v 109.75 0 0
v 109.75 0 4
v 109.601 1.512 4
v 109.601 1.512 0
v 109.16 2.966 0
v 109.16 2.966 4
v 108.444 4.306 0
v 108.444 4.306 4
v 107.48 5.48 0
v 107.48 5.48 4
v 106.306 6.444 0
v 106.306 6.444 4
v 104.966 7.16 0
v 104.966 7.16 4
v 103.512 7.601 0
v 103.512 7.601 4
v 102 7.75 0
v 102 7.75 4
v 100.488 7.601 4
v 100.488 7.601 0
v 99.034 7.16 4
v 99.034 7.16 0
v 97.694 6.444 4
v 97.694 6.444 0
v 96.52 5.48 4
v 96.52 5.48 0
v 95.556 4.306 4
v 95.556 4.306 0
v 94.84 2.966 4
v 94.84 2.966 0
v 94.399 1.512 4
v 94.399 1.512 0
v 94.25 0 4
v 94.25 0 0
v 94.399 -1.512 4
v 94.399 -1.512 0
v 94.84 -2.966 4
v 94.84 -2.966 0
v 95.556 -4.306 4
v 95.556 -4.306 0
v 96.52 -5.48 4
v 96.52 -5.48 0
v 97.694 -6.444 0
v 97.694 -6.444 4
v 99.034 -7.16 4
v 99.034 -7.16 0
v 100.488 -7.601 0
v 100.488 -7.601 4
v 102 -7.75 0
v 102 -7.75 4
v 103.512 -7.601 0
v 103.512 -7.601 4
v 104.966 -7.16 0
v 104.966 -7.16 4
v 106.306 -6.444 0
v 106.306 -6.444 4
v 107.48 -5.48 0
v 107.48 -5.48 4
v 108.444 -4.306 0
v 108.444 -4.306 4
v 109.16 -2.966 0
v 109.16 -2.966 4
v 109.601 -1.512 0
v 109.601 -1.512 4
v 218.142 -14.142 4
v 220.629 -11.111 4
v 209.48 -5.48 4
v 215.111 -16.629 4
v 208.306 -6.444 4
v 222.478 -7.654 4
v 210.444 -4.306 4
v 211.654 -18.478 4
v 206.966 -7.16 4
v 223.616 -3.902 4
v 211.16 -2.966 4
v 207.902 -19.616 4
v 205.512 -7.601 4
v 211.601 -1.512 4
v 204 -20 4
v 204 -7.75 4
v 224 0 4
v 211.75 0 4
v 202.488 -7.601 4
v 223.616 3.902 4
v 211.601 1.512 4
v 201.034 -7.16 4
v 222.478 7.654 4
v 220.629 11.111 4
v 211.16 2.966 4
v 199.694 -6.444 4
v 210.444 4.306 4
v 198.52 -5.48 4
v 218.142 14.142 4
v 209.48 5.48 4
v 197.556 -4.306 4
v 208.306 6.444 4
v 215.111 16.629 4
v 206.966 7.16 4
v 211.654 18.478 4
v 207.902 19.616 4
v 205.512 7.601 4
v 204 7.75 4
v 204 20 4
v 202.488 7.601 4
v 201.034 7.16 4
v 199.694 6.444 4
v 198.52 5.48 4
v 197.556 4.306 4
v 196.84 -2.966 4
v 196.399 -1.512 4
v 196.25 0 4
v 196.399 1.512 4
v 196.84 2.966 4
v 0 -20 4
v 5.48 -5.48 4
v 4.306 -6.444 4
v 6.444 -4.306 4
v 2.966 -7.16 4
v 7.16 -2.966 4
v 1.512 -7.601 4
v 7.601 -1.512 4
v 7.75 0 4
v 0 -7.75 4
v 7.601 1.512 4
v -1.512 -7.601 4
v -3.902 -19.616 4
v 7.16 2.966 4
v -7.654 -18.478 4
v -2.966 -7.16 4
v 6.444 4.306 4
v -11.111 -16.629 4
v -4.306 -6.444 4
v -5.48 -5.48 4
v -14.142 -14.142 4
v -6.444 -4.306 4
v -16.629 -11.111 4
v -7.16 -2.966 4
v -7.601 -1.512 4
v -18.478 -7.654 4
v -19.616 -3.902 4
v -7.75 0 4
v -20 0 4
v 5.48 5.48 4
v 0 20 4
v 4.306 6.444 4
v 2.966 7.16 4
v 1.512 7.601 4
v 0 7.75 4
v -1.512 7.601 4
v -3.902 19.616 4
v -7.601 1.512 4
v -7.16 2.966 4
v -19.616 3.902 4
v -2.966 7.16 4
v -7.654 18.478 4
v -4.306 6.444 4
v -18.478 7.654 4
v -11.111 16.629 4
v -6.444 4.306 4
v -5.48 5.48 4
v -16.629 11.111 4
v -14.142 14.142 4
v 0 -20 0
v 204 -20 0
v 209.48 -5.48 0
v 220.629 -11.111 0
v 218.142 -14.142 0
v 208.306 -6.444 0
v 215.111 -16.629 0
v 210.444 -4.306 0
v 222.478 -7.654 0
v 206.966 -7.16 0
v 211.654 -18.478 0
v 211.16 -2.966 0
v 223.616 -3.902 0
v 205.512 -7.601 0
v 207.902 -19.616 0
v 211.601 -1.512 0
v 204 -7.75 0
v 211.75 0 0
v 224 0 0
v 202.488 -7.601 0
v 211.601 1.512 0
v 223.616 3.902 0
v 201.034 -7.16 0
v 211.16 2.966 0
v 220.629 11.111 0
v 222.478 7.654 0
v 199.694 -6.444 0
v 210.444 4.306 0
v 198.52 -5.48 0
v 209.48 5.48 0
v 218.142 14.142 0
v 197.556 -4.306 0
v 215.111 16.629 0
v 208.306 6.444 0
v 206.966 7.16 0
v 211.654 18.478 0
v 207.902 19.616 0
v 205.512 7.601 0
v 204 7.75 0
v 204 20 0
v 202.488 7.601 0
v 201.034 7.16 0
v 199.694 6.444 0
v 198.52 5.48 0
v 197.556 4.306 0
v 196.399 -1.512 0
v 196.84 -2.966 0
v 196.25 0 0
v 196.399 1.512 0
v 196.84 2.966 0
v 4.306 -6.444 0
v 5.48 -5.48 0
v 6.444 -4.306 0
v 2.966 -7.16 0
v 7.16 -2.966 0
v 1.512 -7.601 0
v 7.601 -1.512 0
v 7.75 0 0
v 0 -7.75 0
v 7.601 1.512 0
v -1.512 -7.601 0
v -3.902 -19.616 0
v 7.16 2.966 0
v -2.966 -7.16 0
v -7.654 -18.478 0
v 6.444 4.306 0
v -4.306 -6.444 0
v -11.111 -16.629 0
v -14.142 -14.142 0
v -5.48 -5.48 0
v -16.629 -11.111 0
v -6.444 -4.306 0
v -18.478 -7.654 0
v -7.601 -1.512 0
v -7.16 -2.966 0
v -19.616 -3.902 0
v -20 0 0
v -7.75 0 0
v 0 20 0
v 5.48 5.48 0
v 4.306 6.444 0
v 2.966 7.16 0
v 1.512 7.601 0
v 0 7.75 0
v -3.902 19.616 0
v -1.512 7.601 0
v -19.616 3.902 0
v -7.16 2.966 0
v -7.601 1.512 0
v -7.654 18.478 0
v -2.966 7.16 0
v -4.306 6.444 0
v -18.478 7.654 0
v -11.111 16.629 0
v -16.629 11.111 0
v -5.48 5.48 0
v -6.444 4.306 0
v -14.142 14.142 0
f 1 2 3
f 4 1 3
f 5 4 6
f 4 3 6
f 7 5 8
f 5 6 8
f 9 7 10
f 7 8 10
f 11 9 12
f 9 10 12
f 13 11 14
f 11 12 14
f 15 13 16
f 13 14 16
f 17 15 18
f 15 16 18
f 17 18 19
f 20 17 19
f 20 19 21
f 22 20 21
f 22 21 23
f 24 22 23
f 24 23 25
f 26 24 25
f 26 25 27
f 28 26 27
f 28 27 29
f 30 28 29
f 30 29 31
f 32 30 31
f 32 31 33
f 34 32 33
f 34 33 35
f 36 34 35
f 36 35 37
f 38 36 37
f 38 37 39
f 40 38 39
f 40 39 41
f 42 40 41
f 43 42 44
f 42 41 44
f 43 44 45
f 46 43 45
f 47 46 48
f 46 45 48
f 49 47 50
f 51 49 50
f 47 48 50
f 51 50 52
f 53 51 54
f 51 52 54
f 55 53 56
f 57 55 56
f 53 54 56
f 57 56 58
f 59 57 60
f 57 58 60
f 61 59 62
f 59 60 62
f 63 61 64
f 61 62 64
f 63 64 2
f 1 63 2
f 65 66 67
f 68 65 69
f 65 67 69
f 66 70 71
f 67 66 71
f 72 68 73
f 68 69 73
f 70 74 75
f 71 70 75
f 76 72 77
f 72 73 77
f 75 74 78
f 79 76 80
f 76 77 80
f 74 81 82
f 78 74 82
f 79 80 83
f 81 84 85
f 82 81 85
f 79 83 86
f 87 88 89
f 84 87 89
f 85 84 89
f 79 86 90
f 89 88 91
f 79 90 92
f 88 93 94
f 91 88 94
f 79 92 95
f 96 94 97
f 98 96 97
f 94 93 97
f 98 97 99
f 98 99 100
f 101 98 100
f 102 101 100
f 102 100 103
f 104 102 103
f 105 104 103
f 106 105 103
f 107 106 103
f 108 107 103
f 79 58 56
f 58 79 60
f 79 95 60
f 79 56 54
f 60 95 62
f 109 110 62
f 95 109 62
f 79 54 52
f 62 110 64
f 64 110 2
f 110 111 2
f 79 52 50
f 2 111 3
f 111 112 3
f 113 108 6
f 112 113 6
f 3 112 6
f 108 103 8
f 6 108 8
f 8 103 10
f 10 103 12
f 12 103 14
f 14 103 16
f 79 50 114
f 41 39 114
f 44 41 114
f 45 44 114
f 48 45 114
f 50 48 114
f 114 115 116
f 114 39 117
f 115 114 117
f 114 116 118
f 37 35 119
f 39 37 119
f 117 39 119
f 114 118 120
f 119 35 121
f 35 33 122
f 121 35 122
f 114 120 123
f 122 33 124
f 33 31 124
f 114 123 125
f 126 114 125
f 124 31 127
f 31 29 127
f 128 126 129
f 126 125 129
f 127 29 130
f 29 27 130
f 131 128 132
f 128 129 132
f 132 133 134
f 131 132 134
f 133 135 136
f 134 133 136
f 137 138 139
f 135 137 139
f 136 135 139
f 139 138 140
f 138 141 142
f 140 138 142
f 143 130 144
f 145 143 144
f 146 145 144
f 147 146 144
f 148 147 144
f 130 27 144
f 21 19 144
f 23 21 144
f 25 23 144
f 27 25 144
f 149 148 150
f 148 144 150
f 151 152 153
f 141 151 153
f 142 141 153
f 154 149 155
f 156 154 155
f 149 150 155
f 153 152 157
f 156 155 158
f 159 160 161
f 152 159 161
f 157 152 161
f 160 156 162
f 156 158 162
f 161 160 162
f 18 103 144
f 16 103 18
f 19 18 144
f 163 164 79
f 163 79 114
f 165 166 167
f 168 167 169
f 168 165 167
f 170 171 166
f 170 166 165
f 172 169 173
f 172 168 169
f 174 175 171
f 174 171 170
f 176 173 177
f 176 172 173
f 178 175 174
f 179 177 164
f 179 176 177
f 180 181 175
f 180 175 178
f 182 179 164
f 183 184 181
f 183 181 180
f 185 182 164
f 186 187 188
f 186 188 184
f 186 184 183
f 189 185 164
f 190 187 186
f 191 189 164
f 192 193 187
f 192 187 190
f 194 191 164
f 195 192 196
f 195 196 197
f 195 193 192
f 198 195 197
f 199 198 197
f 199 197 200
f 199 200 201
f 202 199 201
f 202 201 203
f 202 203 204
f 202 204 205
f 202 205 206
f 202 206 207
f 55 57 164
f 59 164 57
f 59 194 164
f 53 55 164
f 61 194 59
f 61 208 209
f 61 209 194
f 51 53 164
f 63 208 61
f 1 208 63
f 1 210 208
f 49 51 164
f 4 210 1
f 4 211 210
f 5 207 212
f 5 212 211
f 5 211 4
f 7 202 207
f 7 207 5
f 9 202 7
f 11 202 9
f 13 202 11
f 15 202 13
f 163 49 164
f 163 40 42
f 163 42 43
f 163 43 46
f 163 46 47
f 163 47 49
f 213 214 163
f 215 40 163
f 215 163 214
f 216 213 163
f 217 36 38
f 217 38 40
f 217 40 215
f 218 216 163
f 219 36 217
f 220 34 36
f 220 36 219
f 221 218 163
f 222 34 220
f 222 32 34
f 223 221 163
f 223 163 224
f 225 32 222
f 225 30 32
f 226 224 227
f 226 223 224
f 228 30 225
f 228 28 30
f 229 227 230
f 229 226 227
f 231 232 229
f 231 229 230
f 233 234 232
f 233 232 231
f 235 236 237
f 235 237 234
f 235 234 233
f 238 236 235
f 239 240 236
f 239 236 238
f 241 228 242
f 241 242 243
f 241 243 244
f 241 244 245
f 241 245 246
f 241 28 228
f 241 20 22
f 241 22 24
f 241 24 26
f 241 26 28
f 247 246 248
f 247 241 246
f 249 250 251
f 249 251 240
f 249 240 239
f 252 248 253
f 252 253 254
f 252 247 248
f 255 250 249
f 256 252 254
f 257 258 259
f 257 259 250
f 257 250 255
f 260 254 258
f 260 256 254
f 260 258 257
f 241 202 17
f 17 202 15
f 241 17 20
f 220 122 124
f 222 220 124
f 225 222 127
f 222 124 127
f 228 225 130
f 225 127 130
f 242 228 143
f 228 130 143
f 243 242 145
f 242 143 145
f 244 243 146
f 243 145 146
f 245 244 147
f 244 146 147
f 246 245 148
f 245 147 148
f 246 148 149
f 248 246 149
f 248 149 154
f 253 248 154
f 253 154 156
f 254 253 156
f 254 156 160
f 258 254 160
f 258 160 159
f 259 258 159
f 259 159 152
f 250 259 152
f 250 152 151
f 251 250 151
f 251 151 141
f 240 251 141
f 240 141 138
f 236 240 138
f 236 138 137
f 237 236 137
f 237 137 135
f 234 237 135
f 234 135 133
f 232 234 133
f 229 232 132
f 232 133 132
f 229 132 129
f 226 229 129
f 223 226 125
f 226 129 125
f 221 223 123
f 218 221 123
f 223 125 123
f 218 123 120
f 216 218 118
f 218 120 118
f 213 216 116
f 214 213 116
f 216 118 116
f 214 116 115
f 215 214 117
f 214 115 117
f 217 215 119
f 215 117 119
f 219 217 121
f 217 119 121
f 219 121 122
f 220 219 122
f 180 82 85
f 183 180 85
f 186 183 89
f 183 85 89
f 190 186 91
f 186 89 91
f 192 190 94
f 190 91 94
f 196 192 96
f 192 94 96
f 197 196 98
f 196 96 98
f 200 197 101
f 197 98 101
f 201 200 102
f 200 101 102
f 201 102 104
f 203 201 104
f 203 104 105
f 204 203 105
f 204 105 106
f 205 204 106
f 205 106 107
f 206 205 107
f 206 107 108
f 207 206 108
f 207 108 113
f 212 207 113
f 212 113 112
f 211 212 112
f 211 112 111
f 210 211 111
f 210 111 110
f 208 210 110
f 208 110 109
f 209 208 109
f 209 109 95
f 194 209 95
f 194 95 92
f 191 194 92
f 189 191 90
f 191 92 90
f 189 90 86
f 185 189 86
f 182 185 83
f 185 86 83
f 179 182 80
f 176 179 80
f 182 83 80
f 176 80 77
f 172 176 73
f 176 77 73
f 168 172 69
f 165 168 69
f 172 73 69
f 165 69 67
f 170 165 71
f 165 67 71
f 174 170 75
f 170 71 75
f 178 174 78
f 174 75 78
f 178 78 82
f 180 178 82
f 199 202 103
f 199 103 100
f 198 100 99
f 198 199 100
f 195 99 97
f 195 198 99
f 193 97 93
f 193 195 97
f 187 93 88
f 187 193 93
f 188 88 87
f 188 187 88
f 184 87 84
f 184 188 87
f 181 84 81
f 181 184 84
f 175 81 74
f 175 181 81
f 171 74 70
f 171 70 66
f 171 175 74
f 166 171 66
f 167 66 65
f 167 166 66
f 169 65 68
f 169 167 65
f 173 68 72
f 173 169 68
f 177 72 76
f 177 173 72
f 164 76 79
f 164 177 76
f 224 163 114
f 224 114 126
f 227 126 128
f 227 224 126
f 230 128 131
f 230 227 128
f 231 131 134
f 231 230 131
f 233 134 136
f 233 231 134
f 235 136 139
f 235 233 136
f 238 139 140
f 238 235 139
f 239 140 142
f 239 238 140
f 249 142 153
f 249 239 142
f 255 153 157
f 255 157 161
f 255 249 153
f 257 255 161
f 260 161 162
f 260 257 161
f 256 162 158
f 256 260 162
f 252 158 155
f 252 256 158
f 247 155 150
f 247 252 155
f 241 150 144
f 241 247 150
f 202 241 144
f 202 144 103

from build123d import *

# Parameters (mm, degrees)
BOSS_EXTRUDE1_DEPTH = 4
CUT_EXTRUDE1_REACH  = 6
SKETCH2_R           = 7.75
CUT_EXTRUDE2_REACH  = 6
SKETCH3_R           = 7.75


with BuildPart() as part:
    # Sketch1 → Boss-Extrude1 (new body)
    with BuildSketch(Plane.XY):
        with BuildLine():
            Line((0, 20), (204, 20))
            ThreePointArc((204, 20), (224, 0), (204, -20))
            Line((204, -20), (0, -20))
            ThreePointArc((0, -20), (-20, 0), (0, 20))
        make_face()
    extrude(amount=BOSS_EXTRUDE1_DEPTH)

    # Sketch2 → Cut-Extrude1 (cut, up to next)
    with BuildSketch(Plane.XY.offset(4), mode=Mode.PRIVATE) as cut_extrude1_sk1:
        Circle(SKETCH2_R)
    cut_extrude1_tool1 = extrude(cut_extrude1_sk1.sketch, amount=-CUT_EXTRUDE1_REACH, mode=Mode.PRIVATE) & part.part
    add(cut_extrude1_tool1.solids().sort_by_distance((0, 0, 4))[0], mode=Mode.SUBTRACT)
    # Sketch2 → Cut-Extrude1 (cut, up to next)
    with BuildSketch(Plane.XY.offset(4), mode=Mode.PRIVATE) as cut_extrude1_sk2:
        with Locations((204, 0)):
            Circle(SKETCH2_R)
    cut_extrude1_tool2 = extrude(cut_extrude1_sk2.sketch, amount=-CUT_EXTRUDE1_REACH, mode=Mode.PRIVATE) & part.part
    add(cut_extrude1_tool2.solids().sort_by_distance((204, 0, 4))[0], mode=Mode.SUBTRACT)

    # Sketch3 → Cut-Extrude2 (cut, up to next)
    with BuildSketch(Plane.XY.offset(4), mode=Mode.PRIVATE) as cut_extrude2_sk1:
        with Locations((102, 0)):
            Circle(SKETCH3_R)
    cut_extrude2_tool1 = extrude(cut_extrude2_sk1.sketch, amount=-CUT_EXTRUDE2_REACH, mode=Mode.PRIVATE) & part.part
    add(cut_extrude2_tool1.solids().sort_by_distance((102, 0, 4))[0], mode=Mode.SUBTRACT)


solid = part.part
